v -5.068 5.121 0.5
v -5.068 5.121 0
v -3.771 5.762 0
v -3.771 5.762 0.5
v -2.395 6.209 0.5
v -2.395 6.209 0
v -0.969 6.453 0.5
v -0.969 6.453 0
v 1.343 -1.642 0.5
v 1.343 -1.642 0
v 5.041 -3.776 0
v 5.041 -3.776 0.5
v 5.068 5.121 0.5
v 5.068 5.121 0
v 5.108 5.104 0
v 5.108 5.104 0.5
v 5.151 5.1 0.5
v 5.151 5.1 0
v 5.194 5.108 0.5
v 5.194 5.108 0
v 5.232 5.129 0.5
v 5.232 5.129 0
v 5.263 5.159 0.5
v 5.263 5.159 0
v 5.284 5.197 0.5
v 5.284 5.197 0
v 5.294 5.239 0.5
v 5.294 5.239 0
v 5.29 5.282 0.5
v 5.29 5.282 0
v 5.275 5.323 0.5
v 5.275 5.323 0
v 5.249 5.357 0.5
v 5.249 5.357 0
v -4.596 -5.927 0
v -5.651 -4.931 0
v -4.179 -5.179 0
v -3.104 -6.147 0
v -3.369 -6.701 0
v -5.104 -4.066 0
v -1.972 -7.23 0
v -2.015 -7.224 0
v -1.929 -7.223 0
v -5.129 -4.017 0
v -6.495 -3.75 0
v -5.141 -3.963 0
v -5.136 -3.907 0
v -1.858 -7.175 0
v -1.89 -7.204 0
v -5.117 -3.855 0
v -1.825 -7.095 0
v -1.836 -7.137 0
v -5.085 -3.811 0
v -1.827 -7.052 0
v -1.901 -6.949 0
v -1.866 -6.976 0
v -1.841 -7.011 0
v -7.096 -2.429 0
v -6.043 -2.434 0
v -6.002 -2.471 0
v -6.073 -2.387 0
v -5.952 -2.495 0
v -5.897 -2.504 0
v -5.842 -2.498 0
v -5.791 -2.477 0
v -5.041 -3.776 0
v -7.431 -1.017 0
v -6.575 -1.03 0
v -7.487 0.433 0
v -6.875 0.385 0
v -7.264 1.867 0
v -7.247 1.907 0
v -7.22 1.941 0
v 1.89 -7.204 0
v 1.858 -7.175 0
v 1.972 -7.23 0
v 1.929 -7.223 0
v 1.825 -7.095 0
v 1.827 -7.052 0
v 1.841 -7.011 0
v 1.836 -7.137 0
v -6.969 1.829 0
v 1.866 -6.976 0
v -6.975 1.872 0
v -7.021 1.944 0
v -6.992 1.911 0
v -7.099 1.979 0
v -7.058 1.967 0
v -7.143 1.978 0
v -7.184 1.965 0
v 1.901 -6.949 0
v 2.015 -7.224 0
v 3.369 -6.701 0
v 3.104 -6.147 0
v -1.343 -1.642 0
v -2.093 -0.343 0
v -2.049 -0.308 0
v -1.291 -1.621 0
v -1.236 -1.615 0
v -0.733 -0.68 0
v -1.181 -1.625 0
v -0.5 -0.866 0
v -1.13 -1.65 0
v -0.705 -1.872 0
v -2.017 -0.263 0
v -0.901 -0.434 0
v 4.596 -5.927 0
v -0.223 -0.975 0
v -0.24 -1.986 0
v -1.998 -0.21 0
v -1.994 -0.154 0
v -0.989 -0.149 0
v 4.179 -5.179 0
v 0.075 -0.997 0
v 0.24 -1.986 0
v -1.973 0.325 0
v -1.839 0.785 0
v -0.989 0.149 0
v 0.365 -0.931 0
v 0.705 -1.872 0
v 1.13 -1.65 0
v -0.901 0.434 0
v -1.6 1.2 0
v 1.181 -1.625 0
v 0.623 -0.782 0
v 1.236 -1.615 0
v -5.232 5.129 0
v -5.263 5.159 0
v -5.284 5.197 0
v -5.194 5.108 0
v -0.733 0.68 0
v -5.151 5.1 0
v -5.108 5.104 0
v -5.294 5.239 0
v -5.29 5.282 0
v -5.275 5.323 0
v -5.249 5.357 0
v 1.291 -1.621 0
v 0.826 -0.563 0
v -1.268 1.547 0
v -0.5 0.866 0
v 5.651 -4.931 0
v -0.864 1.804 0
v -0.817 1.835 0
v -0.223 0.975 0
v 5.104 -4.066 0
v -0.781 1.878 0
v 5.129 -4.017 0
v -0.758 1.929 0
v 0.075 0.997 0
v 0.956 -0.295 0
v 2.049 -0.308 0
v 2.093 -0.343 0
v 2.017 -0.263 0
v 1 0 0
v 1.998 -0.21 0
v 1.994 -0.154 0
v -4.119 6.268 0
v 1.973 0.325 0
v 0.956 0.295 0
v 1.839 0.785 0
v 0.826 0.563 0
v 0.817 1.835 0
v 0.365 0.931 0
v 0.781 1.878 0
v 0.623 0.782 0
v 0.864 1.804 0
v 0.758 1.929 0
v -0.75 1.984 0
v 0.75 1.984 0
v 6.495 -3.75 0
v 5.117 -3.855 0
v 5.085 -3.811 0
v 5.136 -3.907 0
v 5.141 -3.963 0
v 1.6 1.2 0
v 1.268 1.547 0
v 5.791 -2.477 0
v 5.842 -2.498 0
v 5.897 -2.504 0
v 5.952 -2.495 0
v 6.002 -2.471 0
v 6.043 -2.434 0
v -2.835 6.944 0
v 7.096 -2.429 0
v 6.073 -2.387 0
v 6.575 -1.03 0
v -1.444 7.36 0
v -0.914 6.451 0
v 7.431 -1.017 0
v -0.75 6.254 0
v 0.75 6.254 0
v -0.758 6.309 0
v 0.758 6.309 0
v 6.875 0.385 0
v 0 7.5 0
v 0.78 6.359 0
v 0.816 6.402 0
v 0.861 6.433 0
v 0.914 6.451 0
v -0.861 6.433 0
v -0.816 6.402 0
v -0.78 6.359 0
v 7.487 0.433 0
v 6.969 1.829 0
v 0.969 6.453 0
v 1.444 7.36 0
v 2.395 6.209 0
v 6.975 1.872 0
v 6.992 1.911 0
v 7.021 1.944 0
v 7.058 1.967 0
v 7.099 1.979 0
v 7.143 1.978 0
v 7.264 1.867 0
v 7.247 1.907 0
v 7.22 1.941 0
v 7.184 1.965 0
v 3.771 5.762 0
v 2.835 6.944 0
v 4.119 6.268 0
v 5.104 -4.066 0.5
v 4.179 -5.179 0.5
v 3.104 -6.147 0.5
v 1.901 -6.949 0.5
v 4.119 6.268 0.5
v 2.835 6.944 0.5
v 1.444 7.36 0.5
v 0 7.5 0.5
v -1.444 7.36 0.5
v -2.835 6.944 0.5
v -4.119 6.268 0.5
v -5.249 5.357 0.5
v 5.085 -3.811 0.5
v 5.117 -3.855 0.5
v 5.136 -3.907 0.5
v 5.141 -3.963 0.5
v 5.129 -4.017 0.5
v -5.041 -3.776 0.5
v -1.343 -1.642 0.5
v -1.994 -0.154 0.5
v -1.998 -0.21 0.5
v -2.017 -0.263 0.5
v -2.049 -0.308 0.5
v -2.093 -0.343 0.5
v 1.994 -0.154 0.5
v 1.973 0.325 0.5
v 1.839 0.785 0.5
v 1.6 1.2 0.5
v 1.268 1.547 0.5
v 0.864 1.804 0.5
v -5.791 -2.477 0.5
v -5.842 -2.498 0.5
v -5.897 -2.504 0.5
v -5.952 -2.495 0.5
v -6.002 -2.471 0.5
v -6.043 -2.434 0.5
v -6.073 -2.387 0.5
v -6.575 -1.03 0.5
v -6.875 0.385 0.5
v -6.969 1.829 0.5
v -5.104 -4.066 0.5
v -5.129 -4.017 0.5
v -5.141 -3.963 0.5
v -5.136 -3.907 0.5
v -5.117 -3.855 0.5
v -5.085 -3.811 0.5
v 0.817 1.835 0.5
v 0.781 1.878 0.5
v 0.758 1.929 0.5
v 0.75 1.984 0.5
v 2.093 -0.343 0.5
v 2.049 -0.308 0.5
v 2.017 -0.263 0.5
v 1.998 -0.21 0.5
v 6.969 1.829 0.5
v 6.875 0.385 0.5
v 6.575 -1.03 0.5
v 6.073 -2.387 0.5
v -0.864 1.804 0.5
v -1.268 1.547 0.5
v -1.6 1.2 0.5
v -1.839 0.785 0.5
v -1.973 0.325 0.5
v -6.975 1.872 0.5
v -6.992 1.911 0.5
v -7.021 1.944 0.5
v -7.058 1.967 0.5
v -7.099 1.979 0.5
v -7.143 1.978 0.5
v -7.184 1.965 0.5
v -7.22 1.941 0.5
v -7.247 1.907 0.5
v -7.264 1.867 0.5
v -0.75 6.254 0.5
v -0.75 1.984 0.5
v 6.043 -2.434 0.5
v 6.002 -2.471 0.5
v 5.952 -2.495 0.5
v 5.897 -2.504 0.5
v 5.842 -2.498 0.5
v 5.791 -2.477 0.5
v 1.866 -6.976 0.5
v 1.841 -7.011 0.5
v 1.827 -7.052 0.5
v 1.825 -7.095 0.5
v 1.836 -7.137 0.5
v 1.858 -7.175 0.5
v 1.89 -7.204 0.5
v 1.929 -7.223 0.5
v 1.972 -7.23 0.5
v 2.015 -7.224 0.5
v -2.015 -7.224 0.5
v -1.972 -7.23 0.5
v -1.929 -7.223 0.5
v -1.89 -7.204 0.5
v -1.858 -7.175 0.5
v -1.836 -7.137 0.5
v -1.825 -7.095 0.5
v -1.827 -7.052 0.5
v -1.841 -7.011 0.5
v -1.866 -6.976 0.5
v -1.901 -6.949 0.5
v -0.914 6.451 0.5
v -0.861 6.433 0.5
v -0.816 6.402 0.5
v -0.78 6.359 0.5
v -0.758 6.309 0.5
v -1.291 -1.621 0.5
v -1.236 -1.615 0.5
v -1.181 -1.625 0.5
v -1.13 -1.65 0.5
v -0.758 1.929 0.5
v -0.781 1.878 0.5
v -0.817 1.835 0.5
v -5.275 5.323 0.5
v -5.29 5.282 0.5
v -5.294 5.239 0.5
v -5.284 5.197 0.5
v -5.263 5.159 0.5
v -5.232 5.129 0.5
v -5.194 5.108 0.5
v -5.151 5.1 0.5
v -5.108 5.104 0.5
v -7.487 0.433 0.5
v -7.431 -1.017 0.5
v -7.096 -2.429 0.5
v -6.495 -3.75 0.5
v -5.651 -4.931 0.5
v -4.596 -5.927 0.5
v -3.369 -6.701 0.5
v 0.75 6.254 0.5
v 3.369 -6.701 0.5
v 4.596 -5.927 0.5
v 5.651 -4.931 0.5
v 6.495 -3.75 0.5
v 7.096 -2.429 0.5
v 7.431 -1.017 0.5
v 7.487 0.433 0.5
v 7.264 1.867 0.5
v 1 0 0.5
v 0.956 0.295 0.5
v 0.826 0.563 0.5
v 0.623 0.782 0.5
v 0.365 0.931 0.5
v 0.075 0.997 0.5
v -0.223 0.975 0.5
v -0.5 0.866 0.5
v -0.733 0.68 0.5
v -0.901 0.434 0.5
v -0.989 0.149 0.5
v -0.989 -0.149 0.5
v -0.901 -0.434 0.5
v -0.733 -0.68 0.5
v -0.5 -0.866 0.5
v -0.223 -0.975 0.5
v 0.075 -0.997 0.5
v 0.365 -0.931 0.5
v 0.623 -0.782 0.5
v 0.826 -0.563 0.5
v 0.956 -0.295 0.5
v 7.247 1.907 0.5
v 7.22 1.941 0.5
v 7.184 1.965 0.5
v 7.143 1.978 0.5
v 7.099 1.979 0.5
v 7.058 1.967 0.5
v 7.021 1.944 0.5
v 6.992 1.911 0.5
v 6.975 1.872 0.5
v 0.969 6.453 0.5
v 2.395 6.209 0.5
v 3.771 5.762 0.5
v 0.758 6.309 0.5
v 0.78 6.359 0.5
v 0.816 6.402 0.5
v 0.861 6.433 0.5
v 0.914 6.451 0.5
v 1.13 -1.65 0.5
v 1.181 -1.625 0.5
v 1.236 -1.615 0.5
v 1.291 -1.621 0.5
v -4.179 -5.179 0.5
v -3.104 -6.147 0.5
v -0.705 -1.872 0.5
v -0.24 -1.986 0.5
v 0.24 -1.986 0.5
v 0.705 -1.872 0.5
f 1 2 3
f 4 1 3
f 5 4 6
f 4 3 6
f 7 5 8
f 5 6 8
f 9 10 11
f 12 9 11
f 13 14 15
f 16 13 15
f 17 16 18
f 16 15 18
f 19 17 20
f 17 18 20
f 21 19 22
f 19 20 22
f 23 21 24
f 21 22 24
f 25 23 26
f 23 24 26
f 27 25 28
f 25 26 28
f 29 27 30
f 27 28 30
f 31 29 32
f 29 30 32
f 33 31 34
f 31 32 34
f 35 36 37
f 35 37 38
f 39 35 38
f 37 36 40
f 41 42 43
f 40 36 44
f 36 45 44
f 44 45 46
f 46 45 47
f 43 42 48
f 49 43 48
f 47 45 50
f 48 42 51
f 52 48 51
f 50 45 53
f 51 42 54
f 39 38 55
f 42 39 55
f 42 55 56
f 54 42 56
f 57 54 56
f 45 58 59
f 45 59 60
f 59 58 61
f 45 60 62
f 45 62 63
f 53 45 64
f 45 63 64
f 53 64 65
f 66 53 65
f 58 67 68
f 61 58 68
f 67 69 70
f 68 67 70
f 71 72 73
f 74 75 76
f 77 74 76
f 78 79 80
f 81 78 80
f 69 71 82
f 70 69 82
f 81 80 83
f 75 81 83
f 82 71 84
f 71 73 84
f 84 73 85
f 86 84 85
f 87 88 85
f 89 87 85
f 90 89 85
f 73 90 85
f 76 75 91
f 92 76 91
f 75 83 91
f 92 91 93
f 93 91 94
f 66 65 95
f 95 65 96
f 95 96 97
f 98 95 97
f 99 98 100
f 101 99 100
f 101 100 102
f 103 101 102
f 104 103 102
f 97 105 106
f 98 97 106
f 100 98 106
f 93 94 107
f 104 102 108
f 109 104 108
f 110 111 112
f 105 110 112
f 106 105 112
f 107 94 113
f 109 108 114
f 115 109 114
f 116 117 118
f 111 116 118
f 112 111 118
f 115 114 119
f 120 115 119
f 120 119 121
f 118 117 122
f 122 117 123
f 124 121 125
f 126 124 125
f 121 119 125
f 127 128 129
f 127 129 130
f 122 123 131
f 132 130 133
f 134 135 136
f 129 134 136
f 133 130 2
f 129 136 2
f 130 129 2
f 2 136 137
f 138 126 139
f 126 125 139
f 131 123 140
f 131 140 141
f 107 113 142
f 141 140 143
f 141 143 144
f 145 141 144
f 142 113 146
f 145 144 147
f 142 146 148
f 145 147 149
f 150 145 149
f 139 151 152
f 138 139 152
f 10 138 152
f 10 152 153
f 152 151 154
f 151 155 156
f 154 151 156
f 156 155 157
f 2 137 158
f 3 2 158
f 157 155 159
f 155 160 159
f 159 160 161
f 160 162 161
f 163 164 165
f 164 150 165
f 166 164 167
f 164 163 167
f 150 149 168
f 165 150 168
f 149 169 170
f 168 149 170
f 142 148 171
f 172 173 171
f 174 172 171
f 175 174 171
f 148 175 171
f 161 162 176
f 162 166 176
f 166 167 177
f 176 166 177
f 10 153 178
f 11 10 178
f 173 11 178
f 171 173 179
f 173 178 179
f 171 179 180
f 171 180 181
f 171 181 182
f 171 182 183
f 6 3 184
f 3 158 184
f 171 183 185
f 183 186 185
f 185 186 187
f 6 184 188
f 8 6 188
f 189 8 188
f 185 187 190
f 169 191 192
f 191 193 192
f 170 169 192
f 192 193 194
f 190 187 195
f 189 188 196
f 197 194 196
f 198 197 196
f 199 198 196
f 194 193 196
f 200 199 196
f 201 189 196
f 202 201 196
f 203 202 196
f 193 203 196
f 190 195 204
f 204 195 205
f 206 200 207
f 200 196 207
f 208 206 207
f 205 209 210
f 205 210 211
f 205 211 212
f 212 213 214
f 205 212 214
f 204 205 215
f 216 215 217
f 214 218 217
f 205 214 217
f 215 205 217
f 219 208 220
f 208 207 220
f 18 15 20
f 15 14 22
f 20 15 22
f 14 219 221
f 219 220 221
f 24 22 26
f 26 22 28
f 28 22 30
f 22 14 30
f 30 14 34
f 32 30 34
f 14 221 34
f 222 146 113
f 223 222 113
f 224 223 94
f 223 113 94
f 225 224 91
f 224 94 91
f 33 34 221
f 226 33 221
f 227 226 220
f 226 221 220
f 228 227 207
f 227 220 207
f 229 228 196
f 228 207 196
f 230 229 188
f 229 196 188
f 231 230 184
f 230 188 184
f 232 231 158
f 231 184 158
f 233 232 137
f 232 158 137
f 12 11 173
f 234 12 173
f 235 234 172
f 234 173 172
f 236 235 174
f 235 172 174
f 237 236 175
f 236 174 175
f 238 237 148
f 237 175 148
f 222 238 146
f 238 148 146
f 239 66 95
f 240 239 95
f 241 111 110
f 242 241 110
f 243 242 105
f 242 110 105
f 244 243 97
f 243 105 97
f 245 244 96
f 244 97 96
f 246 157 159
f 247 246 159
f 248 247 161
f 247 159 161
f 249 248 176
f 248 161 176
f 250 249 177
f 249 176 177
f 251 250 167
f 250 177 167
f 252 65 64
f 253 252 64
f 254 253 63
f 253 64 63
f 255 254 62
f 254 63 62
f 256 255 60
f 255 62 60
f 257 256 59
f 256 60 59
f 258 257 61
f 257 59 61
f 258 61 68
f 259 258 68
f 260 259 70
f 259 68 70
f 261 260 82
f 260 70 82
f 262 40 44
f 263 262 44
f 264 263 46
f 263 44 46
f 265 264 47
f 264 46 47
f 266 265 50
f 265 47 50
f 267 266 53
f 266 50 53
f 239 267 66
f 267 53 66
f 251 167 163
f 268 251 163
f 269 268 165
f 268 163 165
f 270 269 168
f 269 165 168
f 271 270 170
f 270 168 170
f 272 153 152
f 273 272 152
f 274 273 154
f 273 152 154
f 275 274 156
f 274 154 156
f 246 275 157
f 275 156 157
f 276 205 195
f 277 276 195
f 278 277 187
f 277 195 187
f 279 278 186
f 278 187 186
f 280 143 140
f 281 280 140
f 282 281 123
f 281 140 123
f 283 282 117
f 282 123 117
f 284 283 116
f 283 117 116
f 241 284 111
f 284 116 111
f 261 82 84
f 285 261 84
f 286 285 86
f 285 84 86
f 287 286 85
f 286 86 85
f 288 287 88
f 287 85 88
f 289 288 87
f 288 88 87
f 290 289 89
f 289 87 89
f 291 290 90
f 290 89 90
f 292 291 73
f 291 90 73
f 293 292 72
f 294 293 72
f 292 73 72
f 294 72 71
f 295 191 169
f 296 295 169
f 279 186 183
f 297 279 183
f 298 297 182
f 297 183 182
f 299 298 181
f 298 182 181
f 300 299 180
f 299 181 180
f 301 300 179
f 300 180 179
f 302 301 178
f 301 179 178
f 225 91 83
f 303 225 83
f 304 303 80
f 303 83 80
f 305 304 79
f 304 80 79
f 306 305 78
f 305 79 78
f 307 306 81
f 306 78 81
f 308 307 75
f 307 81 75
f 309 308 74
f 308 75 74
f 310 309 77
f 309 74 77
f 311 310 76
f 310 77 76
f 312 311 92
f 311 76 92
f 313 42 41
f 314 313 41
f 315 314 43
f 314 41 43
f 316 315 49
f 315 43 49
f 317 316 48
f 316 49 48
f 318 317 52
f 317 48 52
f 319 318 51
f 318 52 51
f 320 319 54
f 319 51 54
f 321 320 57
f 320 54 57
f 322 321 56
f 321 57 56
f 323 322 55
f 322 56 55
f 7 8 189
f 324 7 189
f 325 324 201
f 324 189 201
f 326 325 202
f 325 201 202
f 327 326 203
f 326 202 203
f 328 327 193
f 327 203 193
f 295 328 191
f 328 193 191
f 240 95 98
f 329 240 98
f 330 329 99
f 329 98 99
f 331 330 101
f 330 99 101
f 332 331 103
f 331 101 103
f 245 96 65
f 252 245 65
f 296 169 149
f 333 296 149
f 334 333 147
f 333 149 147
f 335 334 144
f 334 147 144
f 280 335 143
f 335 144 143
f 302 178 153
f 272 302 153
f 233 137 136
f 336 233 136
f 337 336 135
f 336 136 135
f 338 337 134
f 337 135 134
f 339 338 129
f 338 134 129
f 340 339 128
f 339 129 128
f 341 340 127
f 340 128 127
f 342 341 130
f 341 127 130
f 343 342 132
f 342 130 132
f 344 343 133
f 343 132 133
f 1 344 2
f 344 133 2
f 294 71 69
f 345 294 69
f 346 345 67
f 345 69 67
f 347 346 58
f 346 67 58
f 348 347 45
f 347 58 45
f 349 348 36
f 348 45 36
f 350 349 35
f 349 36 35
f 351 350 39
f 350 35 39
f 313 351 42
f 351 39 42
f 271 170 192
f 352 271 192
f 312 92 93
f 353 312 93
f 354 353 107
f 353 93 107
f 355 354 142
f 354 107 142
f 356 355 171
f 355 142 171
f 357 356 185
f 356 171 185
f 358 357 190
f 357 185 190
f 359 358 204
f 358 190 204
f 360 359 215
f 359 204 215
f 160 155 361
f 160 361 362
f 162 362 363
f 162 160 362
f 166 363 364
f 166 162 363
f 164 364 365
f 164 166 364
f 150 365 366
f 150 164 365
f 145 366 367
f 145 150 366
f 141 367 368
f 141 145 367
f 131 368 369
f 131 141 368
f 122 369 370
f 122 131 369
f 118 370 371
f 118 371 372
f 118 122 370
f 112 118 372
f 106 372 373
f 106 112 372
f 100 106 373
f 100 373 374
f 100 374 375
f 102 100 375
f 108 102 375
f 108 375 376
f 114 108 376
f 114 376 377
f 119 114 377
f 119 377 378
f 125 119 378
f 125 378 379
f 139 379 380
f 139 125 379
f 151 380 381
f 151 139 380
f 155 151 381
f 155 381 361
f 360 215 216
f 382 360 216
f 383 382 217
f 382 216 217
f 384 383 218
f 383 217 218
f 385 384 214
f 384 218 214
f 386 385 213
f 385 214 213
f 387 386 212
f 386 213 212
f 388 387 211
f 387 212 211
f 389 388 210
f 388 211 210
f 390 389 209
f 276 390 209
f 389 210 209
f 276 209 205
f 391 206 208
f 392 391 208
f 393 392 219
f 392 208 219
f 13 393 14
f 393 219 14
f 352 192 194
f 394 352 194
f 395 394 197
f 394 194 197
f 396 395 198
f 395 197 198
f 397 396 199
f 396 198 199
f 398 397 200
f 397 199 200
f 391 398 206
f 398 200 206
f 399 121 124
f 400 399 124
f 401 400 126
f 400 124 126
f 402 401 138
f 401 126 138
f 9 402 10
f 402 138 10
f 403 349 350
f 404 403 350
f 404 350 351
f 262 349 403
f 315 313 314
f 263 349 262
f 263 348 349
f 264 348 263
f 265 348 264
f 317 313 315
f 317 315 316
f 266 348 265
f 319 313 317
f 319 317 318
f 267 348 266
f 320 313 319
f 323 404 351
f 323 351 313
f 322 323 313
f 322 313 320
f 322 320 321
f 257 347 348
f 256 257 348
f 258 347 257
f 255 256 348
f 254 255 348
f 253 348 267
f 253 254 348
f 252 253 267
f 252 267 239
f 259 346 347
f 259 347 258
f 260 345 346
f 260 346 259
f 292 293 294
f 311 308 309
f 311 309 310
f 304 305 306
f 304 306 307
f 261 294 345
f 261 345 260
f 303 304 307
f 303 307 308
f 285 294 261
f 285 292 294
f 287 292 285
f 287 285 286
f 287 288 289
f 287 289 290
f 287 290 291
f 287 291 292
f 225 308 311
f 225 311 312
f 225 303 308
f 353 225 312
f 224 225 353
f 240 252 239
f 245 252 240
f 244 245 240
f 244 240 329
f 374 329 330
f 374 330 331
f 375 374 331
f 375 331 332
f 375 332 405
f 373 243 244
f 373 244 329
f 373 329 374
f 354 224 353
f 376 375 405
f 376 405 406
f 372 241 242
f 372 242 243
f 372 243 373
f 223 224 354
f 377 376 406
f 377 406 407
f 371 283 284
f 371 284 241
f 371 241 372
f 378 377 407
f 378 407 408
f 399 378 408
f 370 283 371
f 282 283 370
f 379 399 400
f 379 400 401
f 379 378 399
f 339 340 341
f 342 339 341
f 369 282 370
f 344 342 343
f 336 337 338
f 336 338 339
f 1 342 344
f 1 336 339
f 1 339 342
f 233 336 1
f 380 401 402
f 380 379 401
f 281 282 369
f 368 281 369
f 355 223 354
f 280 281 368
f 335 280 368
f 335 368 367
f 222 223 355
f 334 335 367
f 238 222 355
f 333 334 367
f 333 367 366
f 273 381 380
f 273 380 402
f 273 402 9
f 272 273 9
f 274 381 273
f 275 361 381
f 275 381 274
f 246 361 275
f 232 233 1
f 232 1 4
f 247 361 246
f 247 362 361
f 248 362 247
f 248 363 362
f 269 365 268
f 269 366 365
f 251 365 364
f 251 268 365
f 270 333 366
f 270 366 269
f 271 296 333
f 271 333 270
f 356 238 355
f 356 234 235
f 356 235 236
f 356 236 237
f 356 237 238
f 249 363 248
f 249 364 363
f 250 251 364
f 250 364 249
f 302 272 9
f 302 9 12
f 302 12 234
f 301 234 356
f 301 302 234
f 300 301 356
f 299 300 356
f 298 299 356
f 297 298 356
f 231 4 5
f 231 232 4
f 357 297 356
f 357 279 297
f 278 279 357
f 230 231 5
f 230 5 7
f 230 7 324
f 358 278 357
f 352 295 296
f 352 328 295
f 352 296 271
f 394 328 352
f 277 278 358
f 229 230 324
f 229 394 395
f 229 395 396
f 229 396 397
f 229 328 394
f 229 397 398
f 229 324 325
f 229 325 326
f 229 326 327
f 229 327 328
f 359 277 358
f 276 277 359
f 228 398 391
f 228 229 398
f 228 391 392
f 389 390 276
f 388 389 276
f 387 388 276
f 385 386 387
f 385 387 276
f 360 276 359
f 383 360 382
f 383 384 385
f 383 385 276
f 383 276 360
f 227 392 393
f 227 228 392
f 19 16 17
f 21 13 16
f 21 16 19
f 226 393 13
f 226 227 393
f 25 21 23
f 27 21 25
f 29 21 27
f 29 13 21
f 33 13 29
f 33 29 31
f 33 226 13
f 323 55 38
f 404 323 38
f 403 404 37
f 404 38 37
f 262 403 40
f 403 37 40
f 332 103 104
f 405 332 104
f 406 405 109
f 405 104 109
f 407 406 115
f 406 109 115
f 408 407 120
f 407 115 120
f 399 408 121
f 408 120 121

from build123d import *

# Parameters (mm, degrees)
SKETCH_1_R      = 1
EXTRUDE_2_DEPTH = 0.5


with BuildPart() as part:
    # Эскиз1 → Бобышка-Вытянуть2 (new body)
    with BuildSketch(Plane.XY):
        with BuildLine():
            Line((-0.75, 6.253845396), (-0.75, 1.984313483))
            ThreePointArc((-0.75, 1.984313483), (-0.780777178, 1.877713125), (-0.863636364, 1.803921348))
            ThreePointArc((-0.863636364, 1.803921348), (-1.732050808, 1), (-1.994059896, -0.154029644))
            ThreePointArc((-1.994059896, -0.154029644), (-2.016535856, -0.262683692), (-2.093465886, -0.342637689))
            Line((-2.093465886, -0.342637689), (-5.790988984, -2.477403645))
            ThreePointArc((-5.790988984, -2.477403645), (-5.952066421, -2.494644217), (-6.073072206, -2.38693731))
            ThreePointArc((-6.073072206, -2.38693731), (-6.750627118, -0.327987365), (-6.968602233, 1.828593814))
            ThreePointArc((-6.968602233, 1.828593814), (-7.099193079, 1.978512308), (-7.263875102, 1.867115022))
            ThreePointArc((-7.263875102, 1.867115022), (-6.495190528, -3.75), (-2.01496851, -7.224257879))
            ThreePointArc((-2.01496851, -7.224257879), (-1.836154619, -7.137337707), (-1.90069242, -6.949283469))
            ThreePointArc((-1.90069242, -6.949283469), (-3.659358949, -5.682220893), (-5.103684451, -4.065966154))
            ThreePointArc((-5.103684451, -4.065966154), (-5.136458476, -3.907318617), (-5.040988984, -3.776441751))
            Line((-5.040988984, -3.776441751), (-1.343465886, -1.641675794))
            ThreePointArc((-1.343465886, -1.641675794), (-1.235758679, -1.615029433), (-1.130423532, -1.649891705))
            ThreePointArc((-1.130423532, -1.649891705), (0, -2), (1.130423532, -1.649891705))
            ThreePointArc((1.130423532, -1.649891705), (1.235758679, -1.615029433), (1.343465886, -1.641675794))
            Line((1.343465886, -1.641675794), (5.040988984, -3.776441751))
            ThreePointArc((5.040988984, -3.776441751), (5.136458476, -3.907318617), (5.103684451, -4.065966154))
            ThreePointArc((5.103684451, -4.065966154), (3.659358949, -5.682220893), (1.90069242, -6.949283469))
            ThreePointArc((1.90069242, -6.949283469), (1.836154619, -7.137337707), (2.01496851, -7.224257879))
            ThreePointArc((2.01496851, -7.224257879), (6.495190528, -3.75), (7.263875102, 1.867115022))
            ThreePointArc((7.263875102, 1.867115022), (7.099193079, 1.978512308), (6.968602233, 1.828593814))
            ThreePointArc((6.968602233, 1.828593814), (6.750627118, -0.327987365), (6.073072206, -2.38693731))
            ThreePointArc((6.073072206, -2.38693731), (5.952066421, -2.494644217), (5.790988984, -2.477403645))
            Line((5.790988984, -2.477403645), (2.093465886, -0.342637689))
            ThreePointArc((2.093465886, -0.342637689), (2.016535856, -0.262683692), (1.994059896, -0.154029644))
            ThreePointArc((1.994059896, -0.154029644), (1.732050808, 1), (0.863636364, 1.803921348))
            ThreePointArc((0.863636364, 1.803921348), (0.780777178, 1.877713125), (0.75, 1.984313483))
            Line((0.75, 1.984313483), (0.75, 6.253845396))
            ThreePointArc((0.75, 6.253845396), (0.815607945, 6.401962834), (0.969387755, 6.452903465))
            ThreePointArc((0.969387755, 6.452903465), (3.091268168, 6.010208258), (5.067909813, 5.120689655))
            ThreePointArc((5.067909813, 5.120689655), (5.26303846, 5.158825399), (5.248906592, 5.357142857))
            ThreePointArc((5.248906592, 5.357142857), (0, 7.5), (-5.248906592, 5.357142857))
            ThreePointArc((-5.248906592, 5.357142857), (-5.26303846, 5.158825399), (-5.067909813, 5.120689655))
            ThreePointArc((-5.067909813, 5.120689655), (-3.091268168, 6.010208258), (-0.969387755, 6.452903465))
            ThreePointArc((-0.969387755, 6.452903465), (-0.815607945, 6.401962834), (-0.75, 6.253845396))
        make_face()
        Circle(SKETCH_1_R, mode=Mode.SUBTRACT)
    extrude(amount=EXTRUDE_2_DEPTH)


solid = part.part
